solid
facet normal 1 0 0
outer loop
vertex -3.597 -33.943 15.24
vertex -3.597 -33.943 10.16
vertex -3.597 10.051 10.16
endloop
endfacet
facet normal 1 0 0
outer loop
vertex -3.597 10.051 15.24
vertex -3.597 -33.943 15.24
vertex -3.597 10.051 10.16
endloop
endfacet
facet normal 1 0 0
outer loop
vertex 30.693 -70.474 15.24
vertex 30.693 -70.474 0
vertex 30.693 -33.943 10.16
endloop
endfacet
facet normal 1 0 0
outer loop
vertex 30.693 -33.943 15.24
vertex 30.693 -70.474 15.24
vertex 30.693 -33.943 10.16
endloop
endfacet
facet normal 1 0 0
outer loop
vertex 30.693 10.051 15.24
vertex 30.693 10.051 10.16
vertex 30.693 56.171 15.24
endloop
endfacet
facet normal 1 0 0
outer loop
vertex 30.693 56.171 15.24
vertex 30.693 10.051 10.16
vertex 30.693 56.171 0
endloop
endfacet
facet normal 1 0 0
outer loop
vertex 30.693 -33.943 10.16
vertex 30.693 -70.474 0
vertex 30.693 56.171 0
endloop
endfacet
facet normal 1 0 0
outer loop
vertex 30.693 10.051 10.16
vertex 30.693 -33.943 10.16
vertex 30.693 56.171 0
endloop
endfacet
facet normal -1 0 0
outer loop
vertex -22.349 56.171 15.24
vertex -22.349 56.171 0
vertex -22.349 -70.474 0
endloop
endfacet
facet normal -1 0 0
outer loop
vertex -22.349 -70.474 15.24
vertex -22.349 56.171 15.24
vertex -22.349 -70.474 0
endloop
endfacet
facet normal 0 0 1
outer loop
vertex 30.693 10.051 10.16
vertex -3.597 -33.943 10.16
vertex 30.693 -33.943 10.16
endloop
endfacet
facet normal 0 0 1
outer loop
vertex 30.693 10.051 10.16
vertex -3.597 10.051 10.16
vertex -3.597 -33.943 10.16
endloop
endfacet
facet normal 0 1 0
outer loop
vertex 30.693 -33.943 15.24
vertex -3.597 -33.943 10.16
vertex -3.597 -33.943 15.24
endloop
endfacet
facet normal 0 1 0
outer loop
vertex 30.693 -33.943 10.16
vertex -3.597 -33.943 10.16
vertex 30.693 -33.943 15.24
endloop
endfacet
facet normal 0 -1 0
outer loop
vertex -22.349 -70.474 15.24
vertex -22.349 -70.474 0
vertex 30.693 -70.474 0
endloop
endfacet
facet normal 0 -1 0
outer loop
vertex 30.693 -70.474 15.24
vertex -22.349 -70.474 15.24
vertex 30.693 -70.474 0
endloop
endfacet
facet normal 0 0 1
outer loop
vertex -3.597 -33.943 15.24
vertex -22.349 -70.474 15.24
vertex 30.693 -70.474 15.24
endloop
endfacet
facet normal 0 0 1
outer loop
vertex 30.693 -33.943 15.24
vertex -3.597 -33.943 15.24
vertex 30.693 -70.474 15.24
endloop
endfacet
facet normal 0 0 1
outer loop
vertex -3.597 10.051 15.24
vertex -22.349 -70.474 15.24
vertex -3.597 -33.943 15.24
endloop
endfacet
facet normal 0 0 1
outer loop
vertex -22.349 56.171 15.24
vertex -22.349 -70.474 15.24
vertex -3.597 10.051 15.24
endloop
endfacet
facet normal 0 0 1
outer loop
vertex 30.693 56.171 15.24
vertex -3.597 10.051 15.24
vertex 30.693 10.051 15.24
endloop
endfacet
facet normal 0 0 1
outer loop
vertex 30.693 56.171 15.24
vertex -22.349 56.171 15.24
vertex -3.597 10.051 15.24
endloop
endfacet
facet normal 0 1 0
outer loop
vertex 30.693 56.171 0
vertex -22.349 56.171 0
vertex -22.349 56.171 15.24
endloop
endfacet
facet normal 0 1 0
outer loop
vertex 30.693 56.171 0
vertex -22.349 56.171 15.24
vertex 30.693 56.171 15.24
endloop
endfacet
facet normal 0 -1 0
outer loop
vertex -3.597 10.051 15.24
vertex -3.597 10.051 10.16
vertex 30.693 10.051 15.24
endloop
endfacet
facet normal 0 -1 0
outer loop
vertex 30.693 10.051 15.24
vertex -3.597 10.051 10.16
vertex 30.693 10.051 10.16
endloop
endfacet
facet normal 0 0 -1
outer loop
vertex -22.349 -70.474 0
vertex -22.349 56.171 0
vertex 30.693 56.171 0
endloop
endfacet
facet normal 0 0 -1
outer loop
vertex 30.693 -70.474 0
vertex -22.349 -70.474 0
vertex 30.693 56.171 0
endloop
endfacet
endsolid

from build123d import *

# Parameters (mm, degrees)
F0_W     = 53.0420094728
F0_H     = 126.6452521086
F1_DEPTH = 10.16
F2_W     = 34.2897039372
F2_H     = 36.5310497582
F2_H_2   = 46.119553037
F3_DEPTH = 5.08


with BuildPart() as f1:
    # F0 (on Top) → F1 (new body)
    with BuildSketch(Plane.XY):
        with Locations((4.1718427092, -7.1517303586)):
            Rectangle(F0_W, F0_H)
    extrude(amount=F1_DEPTH)

    # F2 (on face) → F3 (join)
    with BuildSketch(Plane.XY.offset(10.16)):
        with Locations((13.547995477, -52.2088315338)):
            Rectangle(F2_W, F2_H)
        Polygon((-22.3491620272, 56.1708956957), (-22.3491620272, -70.4743564129), (-3.5968564916, -70.4743564129), (-3.5968564916, -33.9433066547), (-3.5968564916, 10.0513426587), (-3.5968564916, 56.1708956957), align=None)
        with Locations((13.547995477, 33.1111191772)):
            Rectangle(F2_W, F2_H_2)
    extrude(amount=F3_DEPTH)


solid = f1.part
